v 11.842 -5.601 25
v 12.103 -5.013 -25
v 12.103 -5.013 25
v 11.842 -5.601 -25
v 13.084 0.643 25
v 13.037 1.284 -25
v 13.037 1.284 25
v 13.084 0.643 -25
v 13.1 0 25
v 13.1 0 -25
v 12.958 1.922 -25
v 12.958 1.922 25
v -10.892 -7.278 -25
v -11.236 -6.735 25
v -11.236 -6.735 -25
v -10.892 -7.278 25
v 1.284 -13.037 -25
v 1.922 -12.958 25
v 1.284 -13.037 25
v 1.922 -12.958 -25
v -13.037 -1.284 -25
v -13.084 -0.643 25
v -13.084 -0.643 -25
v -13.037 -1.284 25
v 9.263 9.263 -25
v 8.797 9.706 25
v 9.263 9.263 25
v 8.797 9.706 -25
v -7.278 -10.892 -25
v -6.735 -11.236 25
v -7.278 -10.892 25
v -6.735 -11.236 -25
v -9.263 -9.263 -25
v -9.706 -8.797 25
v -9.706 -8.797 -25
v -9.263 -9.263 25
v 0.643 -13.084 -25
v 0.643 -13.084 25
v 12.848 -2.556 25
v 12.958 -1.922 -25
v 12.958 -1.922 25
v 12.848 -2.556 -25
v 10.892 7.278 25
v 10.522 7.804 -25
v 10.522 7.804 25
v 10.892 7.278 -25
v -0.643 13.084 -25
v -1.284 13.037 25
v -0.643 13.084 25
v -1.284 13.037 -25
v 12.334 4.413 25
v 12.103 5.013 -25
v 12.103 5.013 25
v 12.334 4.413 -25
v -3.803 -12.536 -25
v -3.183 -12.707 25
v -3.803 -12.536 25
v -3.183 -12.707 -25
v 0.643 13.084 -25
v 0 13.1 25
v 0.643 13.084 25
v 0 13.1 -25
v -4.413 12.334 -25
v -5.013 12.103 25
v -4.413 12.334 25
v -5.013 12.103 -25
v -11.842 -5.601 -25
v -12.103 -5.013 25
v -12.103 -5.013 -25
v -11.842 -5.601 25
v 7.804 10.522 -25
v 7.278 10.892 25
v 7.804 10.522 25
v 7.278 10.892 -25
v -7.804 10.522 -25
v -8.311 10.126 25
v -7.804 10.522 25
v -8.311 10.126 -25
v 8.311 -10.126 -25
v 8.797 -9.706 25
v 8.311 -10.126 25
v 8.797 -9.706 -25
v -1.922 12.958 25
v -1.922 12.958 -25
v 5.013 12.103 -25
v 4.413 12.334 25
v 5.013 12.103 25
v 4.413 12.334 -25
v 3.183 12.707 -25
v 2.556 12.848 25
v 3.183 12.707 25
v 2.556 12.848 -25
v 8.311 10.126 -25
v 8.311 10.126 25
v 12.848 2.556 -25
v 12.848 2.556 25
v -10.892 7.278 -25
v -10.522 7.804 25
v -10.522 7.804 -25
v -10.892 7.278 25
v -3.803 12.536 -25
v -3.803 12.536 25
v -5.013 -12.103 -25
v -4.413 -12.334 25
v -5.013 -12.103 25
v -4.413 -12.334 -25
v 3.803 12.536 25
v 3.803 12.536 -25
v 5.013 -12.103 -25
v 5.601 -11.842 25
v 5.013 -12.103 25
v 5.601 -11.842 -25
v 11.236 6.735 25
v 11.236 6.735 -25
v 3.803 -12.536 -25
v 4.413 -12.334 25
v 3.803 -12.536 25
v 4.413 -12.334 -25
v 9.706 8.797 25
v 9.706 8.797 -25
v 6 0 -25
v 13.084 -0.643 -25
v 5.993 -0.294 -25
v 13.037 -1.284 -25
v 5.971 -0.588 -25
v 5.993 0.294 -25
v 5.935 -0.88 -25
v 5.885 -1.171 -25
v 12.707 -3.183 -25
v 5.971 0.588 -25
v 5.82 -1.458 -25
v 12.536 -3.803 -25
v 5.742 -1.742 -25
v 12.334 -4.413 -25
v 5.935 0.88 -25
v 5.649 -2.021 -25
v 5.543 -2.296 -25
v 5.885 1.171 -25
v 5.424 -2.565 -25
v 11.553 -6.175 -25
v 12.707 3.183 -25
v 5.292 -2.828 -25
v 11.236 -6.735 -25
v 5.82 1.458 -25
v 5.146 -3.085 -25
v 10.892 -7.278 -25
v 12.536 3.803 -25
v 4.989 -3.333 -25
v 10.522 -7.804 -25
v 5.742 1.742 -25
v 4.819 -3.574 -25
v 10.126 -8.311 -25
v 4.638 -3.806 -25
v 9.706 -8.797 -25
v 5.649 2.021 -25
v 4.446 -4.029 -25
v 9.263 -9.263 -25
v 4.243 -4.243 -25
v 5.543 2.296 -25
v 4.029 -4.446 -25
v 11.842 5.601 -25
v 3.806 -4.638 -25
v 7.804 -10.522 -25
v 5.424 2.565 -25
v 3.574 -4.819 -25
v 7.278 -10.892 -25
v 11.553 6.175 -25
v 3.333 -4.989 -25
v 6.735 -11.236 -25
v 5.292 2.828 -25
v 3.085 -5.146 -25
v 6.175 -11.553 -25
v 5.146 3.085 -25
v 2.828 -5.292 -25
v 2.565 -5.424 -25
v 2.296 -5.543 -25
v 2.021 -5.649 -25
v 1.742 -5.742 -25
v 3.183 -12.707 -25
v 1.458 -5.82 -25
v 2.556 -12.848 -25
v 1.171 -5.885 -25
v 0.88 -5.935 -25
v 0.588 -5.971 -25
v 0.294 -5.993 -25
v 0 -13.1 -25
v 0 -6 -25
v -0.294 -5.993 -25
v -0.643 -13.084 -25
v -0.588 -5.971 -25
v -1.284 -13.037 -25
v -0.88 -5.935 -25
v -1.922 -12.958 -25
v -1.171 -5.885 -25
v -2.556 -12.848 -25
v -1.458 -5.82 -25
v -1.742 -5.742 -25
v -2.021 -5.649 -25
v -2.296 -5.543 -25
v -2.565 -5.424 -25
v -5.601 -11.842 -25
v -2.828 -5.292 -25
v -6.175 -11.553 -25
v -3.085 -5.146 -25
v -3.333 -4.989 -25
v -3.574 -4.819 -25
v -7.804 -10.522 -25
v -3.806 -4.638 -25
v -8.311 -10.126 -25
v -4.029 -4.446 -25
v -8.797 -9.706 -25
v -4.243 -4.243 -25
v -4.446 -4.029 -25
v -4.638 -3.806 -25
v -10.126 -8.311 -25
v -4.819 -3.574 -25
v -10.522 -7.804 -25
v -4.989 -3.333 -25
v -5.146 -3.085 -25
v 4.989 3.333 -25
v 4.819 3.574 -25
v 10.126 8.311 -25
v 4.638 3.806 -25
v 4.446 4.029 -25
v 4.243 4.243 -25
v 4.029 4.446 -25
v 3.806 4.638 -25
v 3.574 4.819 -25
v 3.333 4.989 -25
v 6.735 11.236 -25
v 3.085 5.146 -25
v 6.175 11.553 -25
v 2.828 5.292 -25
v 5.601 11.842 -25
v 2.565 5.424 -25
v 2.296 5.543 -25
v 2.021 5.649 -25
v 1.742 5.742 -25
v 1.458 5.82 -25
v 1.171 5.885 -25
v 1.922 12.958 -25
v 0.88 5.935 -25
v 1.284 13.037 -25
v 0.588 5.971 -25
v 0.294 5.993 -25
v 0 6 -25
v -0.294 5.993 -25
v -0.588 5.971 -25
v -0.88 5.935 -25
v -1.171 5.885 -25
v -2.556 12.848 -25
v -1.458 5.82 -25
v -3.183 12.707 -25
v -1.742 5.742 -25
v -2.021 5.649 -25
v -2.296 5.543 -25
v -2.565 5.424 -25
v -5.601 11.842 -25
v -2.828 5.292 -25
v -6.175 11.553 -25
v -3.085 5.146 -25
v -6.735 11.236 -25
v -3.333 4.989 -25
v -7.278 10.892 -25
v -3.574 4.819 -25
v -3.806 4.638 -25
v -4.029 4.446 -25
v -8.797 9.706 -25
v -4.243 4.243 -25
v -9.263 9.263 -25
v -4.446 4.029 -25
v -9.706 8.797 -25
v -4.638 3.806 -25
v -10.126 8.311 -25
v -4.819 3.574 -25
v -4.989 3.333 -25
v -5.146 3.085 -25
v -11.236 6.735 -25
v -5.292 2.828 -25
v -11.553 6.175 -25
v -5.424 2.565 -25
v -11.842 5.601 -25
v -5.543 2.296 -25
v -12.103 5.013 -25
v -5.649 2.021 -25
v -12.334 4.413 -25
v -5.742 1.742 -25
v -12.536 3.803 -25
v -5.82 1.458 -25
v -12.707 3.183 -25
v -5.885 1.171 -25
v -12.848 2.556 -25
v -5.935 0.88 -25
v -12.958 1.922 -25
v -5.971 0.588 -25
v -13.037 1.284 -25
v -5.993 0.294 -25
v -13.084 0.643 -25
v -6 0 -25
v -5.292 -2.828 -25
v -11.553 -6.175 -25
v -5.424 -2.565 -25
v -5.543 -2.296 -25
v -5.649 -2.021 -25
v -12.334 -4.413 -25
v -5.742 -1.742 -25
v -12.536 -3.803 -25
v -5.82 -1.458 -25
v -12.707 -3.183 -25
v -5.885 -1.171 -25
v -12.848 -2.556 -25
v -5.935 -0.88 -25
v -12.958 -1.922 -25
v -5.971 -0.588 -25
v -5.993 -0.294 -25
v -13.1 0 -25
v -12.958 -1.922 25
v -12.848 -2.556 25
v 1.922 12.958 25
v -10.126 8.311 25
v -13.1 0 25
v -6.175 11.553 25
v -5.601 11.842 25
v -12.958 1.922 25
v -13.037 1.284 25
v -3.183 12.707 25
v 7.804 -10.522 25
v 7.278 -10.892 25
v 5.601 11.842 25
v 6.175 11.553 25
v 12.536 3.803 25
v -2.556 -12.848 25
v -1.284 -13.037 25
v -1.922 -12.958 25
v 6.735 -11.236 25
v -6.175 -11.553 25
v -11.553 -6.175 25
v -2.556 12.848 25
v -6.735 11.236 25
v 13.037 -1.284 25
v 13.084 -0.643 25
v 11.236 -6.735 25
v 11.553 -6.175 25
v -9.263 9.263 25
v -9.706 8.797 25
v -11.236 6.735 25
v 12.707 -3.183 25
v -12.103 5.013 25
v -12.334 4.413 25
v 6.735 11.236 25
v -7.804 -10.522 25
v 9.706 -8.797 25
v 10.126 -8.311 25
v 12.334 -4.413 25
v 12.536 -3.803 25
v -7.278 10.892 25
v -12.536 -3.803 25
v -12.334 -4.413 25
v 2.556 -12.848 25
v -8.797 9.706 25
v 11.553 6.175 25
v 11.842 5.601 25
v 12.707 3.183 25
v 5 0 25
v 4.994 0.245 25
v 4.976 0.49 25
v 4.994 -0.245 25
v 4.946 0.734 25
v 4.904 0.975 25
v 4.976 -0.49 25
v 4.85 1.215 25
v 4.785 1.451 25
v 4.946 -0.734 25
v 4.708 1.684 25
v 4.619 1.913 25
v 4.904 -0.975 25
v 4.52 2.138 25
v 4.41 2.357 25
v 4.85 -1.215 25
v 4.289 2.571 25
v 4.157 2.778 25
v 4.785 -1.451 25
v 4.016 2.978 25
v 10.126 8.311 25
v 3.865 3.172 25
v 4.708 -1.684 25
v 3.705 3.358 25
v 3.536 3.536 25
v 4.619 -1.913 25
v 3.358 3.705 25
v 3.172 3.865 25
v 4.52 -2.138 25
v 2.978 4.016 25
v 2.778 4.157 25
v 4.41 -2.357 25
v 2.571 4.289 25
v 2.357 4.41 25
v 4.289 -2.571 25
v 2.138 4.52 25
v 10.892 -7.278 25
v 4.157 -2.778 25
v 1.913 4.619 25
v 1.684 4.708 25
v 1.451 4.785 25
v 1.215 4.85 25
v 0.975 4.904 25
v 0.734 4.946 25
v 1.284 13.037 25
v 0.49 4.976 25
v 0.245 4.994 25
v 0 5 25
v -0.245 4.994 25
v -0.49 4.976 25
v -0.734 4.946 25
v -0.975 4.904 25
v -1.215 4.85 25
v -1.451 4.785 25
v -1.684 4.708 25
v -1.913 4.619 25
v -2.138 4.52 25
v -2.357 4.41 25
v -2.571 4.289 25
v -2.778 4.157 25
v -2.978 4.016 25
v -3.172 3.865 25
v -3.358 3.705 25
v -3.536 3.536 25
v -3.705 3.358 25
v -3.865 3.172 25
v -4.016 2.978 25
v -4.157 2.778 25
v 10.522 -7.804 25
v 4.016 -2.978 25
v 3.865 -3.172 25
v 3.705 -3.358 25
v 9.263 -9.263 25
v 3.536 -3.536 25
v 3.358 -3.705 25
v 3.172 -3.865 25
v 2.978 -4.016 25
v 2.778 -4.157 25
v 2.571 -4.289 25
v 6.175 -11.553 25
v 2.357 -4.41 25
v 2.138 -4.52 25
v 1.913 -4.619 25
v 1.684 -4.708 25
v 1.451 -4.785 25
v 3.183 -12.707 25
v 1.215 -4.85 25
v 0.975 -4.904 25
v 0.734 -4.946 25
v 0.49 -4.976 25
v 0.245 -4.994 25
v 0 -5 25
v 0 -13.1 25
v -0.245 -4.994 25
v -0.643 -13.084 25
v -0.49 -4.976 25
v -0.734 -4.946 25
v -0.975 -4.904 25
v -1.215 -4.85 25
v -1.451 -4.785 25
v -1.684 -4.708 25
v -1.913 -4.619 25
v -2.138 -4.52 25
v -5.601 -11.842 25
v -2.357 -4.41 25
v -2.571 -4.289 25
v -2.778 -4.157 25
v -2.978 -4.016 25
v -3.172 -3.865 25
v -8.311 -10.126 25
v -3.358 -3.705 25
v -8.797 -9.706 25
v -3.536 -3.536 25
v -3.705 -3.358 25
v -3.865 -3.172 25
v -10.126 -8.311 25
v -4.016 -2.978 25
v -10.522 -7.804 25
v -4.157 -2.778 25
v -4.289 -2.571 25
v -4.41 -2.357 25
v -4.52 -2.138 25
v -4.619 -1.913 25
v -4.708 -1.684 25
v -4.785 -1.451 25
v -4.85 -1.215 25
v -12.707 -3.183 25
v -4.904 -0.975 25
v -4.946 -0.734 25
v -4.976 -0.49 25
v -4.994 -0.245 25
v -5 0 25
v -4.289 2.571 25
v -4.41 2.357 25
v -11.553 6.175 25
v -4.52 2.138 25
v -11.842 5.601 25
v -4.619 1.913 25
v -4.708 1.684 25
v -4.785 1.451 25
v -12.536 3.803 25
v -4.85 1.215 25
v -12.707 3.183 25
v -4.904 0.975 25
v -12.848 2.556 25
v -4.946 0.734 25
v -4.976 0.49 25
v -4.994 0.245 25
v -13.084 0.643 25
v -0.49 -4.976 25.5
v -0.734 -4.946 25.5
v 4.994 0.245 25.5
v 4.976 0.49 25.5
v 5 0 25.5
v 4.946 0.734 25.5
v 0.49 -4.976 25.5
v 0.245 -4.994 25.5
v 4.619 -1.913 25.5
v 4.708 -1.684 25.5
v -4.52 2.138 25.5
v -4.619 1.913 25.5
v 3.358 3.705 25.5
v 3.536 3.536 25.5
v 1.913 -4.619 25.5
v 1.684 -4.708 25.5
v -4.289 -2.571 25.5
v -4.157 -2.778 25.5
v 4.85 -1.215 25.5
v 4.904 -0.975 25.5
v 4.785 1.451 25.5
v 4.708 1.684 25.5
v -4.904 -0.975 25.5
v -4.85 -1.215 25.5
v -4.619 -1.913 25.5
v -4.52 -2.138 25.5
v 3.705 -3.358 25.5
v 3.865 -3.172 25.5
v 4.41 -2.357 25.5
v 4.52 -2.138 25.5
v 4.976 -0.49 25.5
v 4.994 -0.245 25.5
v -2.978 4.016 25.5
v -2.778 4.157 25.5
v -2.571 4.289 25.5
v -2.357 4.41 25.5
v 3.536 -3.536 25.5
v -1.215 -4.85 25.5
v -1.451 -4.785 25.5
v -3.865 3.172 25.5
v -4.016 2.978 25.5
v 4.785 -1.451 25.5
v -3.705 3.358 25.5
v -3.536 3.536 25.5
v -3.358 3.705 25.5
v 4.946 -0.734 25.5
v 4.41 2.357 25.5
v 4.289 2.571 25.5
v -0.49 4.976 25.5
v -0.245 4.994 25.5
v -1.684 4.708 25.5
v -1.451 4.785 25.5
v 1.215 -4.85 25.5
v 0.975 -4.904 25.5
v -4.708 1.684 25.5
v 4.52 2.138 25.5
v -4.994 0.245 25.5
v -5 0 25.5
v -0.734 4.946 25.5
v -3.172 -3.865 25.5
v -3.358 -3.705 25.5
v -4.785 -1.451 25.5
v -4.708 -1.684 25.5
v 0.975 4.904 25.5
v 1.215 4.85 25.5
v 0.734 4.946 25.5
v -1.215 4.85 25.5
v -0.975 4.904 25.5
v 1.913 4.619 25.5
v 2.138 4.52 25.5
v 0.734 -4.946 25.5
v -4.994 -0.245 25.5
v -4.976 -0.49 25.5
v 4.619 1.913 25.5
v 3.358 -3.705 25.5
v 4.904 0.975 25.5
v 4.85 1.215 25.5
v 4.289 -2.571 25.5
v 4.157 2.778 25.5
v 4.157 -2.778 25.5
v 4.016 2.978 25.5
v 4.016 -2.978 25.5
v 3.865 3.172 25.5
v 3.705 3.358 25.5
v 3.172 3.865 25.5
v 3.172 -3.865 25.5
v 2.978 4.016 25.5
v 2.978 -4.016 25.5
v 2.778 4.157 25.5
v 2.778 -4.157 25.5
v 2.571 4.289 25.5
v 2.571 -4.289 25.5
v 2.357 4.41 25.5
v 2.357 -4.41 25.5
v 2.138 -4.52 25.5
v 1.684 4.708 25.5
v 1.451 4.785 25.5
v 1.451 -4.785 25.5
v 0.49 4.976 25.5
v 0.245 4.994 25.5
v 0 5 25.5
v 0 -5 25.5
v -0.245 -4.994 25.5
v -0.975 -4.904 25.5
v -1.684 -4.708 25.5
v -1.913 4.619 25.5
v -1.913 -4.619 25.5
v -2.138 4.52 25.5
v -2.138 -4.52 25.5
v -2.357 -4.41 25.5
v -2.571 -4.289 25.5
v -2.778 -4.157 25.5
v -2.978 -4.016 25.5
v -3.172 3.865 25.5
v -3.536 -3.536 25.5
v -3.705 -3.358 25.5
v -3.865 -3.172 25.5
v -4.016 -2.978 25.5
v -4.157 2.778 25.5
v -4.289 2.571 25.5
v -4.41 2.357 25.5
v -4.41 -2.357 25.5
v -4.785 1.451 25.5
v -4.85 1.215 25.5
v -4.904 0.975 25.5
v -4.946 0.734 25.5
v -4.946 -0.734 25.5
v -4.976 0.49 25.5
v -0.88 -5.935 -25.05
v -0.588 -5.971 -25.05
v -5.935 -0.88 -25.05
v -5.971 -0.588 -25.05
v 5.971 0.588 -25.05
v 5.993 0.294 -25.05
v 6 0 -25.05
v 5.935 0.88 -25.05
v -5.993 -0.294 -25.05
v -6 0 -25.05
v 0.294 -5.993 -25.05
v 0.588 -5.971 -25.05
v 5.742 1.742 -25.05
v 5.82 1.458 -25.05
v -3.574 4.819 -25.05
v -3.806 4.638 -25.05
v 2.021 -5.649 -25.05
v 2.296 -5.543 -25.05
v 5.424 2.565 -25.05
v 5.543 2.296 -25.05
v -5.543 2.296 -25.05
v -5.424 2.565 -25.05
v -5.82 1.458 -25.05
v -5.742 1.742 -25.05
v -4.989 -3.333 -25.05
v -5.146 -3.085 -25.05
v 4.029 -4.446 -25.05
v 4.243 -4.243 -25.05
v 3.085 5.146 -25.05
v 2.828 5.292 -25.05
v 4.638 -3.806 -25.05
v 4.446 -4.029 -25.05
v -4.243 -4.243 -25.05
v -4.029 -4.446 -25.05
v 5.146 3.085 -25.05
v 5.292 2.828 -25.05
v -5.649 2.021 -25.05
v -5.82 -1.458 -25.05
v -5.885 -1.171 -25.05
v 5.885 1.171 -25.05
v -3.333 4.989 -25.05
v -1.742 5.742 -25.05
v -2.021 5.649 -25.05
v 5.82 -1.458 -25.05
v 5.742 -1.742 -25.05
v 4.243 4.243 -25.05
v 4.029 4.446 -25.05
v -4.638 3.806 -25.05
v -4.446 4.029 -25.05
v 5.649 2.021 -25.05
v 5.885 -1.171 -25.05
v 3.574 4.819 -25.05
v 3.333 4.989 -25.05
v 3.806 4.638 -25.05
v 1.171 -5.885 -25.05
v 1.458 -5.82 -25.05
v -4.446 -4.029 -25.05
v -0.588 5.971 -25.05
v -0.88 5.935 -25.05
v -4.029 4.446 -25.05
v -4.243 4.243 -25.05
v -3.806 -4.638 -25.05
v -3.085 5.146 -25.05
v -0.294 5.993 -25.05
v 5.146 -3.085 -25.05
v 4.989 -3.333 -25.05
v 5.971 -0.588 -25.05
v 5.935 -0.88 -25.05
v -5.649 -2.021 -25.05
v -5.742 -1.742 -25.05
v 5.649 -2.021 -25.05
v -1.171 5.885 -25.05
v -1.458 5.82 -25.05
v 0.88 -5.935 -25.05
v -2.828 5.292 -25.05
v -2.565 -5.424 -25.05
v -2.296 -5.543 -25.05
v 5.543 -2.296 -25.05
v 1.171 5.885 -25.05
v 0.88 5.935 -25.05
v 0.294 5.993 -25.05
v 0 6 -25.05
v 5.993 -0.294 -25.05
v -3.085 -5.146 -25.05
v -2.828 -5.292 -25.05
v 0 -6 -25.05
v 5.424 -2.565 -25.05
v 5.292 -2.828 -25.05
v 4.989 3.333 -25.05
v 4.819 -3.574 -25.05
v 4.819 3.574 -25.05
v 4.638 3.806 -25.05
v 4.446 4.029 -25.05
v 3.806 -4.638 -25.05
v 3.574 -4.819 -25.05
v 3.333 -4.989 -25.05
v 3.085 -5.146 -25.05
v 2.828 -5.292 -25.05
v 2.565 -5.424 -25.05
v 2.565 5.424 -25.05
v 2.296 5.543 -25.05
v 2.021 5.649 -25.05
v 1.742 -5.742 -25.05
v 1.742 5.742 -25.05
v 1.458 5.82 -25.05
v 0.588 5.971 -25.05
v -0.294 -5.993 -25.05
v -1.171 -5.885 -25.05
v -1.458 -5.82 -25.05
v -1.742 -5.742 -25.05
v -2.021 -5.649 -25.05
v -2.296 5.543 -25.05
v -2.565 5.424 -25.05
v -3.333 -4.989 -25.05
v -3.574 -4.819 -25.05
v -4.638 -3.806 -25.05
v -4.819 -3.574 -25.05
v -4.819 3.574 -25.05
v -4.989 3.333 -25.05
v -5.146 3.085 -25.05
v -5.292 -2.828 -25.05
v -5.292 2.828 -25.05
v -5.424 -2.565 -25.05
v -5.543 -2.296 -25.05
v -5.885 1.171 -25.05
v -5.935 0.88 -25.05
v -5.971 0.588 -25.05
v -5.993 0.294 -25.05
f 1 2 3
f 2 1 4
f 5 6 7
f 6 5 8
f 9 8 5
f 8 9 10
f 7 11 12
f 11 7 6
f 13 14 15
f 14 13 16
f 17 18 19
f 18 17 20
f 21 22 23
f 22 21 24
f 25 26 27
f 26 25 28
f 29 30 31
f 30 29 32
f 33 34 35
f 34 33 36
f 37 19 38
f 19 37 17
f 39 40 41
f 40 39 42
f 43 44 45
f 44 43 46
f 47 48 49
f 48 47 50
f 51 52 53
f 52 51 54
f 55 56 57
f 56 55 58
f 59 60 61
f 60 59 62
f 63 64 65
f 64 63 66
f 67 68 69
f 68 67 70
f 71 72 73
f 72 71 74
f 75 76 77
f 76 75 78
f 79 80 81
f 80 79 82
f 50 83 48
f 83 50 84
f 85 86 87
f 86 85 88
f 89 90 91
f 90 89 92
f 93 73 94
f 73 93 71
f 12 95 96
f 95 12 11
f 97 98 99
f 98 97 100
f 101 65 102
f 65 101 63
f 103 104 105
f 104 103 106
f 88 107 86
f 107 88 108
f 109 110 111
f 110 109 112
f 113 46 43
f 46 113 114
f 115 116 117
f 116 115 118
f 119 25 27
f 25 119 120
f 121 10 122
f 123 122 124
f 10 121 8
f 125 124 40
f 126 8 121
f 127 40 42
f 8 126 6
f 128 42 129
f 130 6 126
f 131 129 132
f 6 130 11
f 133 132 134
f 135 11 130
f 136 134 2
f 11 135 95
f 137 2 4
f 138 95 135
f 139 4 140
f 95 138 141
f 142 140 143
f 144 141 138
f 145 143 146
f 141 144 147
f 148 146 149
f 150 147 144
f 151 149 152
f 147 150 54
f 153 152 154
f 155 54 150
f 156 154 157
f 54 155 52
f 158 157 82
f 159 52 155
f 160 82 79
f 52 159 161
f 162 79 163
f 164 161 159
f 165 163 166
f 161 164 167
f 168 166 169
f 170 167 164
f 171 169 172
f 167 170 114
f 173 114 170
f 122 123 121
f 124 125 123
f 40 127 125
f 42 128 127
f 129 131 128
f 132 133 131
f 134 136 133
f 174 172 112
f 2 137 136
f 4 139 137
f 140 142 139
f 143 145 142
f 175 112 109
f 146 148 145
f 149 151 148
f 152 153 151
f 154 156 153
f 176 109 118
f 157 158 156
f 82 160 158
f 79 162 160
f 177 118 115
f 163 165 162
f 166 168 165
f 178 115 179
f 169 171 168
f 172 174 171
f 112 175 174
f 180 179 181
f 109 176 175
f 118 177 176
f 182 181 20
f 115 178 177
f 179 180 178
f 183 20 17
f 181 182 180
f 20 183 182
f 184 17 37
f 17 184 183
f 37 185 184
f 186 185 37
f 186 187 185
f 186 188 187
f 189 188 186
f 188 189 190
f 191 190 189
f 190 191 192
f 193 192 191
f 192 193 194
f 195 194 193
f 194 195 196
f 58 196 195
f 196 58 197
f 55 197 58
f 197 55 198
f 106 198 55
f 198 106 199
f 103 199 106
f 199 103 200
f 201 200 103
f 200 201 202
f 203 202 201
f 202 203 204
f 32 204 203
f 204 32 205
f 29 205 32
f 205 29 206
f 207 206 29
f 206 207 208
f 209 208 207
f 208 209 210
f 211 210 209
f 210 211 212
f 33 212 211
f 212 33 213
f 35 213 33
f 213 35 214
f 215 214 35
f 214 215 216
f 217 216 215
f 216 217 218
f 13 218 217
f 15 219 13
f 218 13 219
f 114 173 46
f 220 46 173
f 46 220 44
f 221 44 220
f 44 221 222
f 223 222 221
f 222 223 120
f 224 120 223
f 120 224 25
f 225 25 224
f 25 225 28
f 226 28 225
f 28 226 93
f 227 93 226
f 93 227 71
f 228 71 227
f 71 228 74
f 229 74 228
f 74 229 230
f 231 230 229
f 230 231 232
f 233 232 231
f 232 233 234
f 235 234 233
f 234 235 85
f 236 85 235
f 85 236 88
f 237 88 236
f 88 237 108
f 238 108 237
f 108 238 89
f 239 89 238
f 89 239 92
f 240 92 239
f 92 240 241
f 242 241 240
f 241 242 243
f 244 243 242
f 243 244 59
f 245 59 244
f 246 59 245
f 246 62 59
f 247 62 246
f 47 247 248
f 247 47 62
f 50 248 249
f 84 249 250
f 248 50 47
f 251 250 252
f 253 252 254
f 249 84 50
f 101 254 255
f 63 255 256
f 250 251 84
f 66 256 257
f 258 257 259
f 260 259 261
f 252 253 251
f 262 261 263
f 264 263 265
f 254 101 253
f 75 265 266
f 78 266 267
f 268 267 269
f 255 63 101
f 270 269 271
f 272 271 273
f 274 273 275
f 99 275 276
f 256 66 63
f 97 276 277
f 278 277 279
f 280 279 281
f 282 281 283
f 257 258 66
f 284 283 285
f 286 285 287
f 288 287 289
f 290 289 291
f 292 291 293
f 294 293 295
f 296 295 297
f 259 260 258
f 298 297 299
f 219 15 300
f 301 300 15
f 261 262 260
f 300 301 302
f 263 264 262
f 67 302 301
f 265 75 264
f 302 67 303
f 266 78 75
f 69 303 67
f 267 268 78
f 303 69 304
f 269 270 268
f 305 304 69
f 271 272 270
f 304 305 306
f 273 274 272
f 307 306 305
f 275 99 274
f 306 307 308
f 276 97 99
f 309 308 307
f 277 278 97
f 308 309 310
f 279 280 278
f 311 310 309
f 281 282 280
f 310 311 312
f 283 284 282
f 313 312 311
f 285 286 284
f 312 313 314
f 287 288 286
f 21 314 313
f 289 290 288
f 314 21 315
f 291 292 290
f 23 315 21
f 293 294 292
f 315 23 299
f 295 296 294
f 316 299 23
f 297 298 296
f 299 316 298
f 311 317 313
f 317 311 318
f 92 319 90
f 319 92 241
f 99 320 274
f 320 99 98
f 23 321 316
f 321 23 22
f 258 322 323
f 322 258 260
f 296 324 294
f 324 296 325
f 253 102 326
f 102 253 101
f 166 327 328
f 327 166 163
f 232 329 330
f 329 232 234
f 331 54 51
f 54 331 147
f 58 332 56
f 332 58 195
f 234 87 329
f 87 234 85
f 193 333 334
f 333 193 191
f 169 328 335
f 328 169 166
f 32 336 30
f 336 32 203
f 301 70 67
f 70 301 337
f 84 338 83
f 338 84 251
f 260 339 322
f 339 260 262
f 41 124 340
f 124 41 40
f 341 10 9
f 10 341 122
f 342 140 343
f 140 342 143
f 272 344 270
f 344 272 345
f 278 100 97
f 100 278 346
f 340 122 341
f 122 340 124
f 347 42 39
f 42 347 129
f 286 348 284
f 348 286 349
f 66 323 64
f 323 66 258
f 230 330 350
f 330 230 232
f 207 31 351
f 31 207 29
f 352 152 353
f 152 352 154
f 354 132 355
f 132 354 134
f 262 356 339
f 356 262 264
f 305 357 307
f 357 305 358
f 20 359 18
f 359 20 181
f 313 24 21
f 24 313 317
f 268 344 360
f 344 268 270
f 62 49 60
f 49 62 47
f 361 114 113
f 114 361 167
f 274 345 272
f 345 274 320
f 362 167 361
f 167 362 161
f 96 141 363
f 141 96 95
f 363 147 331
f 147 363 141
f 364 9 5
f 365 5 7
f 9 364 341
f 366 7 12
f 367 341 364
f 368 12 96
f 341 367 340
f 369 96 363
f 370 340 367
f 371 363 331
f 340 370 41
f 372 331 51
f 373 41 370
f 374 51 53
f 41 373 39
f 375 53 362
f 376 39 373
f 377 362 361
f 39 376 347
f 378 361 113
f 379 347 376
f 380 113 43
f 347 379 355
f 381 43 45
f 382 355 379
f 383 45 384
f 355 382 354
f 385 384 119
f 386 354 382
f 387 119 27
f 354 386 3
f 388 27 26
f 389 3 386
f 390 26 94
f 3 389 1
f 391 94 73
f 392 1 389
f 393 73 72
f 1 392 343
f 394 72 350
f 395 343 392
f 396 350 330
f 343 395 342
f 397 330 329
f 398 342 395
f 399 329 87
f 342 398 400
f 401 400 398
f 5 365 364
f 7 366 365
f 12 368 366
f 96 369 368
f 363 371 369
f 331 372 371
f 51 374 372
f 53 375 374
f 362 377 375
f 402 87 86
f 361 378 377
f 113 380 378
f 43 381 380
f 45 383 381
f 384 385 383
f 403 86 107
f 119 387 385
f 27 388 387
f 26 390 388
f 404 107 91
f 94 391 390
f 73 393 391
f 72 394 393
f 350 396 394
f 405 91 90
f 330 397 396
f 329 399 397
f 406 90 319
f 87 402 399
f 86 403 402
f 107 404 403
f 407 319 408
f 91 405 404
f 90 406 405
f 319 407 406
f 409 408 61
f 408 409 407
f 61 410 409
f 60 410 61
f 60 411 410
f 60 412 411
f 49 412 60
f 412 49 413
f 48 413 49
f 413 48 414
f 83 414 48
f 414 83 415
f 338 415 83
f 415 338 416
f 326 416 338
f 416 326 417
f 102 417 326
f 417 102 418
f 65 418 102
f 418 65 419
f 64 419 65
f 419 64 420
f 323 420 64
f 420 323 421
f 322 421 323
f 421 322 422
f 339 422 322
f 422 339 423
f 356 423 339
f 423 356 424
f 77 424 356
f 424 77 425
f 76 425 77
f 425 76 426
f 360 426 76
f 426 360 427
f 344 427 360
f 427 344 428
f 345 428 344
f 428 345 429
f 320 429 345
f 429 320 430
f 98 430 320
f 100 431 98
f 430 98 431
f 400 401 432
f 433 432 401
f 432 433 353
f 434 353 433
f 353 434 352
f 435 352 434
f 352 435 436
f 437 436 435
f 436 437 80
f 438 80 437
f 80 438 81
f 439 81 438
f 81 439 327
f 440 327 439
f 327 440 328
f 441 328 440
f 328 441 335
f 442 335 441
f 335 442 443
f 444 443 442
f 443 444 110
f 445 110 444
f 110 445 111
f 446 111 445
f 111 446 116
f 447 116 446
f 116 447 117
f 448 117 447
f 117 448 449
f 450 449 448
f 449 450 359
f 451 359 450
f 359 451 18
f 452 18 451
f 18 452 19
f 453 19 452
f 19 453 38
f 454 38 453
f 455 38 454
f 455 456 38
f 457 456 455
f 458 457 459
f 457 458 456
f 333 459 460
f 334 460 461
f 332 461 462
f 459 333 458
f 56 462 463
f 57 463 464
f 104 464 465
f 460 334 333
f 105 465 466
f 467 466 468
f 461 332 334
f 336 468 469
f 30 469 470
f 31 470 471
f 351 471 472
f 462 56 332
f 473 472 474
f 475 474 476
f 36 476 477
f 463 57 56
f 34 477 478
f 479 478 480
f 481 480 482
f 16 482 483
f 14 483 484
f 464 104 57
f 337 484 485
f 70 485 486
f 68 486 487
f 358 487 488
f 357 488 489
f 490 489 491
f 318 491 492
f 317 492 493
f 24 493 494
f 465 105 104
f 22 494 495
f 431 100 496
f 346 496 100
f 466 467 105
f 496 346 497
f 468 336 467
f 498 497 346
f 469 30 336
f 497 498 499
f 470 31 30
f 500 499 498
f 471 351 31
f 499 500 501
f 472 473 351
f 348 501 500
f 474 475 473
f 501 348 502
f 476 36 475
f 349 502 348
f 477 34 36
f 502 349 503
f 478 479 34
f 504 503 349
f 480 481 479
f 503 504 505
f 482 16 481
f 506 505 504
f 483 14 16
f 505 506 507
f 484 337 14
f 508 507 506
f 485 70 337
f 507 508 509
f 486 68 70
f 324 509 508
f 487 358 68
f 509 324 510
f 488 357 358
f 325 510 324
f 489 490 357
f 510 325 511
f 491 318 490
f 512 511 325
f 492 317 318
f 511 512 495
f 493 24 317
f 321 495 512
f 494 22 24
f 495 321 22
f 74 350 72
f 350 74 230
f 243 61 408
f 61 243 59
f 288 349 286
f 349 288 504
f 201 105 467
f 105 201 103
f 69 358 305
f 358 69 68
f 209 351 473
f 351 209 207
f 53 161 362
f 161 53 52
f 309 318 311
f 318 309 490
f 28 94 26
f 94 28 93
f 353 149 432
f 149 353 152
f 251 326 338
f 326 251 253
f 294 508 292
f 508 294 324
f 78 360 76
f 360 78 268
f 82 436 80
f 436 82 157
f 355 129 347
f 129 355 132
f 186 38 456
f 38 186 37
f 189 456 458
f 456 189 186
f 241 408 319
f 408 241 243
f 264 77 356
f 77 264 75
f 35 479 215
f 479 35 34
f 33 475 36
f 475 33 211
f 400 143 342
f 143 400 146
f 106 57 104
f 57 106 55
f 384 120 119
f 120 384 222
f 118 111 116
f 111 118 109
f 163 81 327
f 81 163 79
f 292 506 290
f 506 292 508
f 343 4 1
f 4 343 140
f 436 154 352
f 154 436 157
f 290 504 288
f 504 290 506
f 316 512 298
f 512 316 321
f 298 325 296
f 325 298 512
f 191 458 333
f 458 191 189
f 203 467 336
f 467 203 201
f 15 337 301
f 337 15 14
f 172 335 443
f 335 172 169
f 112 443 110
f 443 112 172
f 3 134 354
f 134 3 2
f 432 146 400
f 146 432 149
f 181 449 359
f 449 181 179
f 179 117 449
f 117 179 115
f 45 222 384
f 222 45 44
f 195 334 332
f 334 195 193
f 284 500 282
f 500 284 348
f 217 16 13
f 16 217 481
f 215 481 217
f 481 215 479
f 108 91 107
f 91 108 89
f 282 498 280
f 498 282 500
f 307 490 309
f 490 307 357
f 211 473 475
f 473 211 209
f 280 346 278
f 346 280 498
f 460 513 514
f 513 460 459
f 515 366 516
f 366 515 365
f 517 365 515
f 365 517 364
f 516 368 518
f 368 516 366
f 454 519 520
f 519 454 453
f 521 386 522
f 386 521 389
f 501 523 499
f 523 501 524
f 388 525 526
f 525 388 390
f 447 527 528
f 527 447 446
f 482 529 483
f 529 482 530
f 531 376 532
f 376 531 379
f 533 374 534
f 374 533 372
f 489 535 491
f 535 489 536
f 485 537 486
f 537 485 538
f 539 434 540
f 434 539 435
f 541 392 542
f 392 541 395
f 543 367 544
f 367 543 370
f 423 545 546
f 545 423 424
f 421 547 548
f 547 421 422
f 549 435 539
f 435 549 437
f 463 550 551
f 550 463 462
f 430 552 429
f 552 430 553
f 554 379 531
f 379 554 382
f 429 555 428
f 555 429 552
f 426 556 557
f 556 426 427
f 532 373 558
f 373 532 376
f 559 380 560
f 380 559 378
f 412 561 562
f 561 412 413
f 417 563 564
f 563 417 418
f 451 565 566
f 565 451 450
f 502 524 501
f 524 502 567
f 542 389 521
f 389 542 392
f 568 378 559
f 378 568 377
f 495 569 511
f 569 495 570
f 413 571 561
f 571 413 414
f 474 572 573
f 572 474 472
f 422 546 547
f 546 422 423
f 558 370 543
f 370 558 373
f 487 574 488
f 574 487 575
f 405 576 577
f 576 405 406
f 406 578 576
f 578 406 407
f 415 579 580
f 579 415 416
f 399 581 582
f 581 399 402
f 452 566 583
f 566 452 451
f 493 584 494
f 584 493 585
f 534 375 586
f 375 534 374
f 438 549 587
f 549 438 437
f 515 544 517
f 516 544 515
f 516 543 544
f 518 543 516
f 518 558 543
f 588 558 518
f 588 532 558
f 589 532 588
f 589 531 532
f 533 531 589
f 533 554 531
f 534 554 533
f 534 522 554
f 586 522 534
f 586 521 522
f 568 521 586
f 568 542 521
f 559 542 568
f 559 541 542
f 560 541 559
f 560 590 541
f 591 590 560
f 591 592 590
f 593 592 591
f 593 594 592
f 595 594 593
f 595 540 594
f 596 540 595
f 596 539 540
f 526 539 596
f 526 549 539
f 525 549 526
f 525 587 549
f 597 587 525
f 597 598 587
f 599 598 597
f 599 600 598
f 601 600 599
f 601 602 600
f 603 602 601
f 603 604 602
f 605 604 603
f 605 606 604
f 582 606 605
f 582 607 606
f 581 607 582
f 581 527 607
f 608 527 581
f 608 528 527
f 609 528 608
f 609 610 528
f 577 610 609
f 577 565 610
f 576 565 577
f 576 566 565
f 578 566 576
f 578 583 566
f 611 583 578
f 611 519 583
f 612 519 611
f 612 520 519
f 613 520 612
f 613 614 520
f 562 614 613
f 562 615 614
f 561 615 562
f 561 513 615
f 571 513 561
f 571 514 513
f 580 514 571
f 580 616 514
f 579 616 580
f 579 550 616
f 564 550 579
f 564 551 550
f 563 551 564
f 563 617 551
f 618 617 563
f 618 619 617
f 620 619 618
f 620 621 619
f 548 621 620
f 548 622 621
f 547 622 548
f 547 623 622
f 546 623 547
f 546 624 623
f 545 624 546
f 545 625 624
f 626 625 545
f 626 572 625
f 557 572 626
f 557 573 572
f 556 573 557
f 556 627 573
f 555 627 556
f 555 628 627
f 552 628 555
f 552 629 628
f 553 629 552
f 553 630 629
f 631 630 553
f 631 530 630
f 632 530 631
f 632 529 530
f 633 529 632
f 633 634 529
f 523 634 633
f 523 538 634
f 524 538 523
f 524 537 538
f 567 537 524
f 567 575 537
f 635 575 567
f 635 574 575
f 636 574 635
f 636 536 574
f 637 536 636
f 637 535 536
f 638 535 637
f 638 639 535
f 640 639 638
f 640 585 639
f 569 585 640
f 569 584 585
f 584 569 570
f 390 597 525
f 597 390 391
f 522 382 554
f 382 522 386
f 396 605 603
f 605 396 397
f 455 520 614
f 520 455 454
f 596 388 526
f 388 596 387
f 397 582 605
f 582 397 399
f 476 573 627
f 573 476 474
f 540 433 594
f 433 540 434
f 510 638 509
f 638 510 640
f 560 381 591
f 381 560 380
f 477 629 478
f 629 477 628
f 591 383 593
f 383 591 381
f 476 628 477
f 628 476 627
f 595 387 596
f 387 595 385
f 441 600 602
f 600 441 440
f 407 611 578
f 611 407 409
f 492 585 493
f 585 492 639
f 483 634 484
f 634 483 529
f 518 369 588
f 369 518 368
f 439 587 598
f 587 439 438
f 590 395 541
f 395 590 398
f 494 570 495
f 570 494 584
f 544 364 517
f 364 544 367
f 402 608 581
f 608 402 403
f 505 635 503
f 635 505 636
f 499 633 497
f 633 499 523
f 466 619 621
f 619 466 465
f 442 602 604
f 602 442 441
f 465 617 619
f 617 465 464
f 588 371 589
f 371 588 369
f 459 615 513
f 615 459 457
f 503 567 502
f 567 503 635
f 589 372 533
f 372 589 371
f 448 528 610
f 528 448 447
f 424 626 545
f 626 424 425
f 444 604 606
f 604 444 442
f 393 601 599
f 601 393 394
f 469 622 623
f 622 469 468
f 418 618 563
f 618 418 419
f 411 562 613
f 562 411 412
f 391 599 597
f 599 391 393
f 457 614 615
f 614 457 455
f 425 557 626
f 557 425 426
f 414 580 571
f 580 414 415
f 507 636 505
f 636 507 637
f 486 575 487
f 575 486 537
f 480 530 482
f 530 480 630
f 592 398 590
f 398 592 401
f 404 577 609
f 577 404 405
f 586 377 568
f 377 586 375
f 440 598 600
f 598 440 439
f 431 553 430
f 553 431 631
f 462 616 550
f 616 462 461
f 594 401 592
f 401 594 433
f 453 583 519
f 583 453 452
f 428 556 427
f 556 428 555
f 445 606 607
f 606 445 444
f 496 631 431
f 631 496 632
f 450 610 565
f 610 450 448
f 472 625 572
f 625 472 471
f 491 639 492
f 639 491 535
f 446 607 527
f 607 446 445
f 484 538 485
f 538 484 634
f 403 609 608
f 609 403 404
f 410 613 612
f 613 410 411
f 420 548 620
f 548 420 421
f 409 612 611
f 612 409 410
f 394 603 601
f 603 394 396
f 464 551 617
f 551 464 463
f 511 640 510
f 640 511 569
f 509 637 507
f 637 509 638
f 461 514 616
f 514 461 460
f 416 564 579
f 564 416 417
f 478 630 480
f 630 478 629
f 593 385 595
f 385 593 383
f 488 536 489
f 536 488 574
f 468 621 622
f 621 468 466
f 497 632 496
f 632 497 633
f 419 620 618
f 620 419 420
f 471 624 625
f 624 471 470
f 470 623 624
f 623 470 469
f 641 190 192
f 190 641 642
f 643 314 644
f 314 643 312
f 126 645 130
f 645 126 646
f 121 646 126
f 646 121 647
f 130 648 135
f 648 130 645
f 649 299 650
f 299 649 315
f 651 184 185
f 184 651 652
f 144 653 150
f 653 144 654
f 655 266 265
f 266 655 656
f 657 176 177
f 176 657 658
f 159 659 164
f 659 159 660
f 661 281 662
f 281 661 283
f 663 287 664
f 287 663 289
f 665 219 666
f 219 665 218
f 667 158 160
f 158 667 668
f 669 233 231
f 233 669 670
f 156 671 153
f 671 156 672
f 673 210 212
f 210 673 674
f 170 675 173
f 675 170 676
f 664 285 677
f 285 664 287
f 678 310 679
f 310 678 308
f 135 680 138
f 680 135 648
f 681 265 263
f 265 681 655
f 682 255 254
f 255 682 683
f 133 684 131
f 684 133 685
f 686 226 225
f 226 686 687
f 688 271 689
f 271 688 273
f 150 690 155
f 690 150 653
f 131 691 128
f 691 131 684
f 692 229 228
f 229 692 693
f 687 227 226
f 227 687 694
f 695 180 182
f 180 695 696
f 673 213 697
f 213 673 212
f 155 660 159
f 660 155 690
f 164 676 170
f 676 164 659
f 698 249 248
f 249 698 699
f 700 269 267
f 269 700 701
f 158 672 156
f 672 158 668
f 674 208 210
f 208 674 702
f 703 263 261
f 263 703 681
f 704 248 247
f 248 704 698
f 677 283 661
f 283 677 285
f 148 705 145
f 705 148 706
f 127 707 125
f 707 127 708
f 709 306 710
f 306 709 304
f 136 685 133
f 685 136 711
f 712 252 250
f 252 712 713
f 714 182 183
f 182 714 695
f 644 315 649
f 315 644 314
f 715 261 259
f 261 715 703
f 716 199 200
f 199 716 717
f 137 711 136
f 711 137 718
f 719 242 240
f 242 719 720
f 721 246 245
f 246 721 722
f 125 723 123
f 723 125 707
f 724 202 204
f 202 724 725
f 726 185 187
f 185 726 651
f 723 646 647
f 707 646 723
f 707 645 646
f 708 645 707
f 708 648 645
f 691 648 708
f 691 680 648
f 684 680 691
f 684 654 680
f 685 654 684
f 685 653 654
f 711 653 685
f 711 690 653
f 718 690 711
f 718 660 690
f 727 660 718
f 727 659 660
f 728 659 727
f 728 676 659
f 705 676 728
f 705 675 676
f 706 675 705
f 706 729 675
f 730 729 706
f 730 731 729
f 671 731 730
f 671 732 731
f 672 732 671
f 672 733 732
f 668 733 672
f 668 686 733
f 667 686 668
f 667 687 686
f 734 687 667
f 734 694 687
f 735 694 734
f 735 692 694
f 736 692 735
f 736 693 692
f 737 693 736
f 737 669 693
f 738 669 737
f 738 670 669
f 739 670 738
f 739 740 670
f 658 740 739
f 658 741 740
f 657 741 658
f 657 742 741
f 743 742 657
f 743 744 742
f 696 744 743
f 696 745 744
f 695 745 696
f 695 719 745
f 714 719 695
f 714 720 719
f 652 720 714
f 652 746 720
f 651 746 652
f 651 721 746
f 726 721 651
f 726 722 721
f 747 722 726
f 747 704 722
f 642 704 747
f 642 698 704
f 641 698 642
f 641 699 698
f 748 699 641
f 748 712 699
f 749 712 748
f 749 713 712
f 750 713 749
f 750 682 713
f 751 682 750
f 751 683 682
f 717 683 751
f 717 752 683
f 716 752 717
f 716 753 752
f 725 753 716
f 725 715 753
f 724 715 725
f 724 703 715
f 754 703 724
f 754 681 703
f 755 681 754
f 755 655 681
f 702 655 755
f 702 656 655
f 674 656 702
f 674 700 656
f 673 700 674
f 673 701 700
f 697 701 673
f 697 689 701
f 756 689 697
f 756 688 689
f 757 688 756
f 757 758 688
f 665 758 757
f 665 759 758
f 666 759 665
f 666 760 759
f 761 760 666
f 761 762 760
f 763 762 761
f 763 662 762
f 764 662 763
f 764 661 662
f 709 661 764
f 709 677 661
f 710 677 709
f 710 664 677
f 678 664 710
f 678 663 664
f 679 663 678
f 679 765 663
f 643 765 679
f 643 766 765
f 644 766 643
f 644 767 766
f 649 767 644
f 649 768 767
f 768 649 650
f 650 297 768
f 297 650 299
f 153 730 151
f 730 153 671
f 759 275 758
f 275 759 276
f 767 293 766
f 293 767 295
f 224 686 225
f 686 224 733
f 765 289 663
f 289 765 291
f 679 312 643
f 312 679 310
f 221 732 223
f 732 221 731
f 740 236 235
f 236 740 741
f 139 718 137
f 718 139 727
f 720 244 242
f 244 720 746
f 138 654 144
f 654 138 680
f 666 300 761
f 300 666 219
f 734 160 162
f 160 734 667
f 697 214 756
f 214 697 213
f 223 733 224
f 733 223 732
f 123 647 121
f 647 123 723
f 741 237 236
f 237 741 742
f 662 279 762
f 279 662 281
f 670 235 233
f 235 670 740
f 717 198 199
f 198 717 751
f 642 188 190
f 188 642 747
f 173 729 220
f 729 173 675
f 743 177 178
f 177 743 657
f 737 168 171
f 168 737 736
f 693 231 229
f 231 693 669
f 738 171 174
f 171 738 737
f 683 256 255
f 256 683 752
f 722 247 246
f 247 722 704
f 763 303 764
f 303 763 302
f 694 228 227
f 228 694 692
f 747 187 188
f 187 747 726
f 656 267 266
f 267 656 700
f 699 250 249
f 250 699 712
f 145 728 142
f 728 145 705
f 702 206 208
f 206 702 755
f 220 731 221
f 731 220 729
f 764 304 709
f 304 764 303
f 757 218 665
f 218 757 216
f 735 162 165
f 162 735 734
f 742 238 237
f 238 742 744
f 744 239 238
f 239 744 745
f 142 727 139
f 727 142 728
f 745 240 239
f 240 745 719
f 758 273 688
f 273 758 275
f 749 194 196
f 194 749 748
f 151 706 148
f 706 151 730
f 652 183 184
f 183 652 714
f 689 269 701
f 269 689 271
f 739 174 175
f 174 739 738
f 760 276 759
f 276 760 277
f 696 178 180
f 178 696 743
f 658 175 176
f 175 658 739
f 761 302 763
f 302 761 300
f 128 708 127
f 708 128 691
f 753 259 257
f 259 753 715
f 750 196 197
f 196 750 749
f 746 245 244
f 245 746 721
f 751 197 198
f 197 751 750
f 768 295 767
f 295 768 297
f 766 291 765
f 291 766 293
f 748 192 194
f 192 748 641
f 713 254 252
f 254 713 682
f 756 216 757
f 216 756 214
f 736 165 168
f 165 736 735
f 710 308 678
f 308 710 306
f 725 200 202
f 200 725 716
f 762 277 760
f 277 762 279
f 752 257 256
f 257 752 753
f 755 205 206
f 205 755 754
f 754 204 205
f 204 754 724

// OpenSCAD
// Battery cell: 50.0mm tall, 26.2mm diameter (one connected solid)

height_mm = 50.0; //[25.0:100.0:0.1]
diameter_mm = 26.2; //[13.1:52.4:0.1]

positive_terminal_diameter_mm = 10.0; //[5.0:20.0:0.1]
positive_terminal_height_mm = 1.5; //[0.75:3.0:0.1]

negative_terminal_diameter_mm = 12.0; //[6.0:24.0:0.1]
negative_terminal_height_mm = 0.5; //[0.25:1.0:0.05]

terminal_overlap_mm = 1.0; //[0.5:2.0:0.1]

$fn = 128;

module battery_cell() {
    r_body = diameter_mm/2;

    // Ensure a real overlap (prevents coincident faces) and never exceed terminal height
    eps = 0.05;
    overlap_pos = min(positive_terminal_height_mm - eps, terminal_overlap_mm);
    overlap_neg = min(negative_terminal_height_mm - eps, terminal_overlap_mm);

    union() {
        // Main body
        cylinder(r=r_body, h=height_mm, center=true);

        // Positive terminal (top), overlaps into body
        translate([0, 0, height_mm/2 + positive_terminal_height_mm/2 - overlap_pos])
            cylinder(r=positive_terminal_diameter_mm/2, h=positive_terminal_height_mm, center=true);

        // Negative terminal (bottom), overlaps into body
        translate([0, 0, -height_mm/2 - negative_terminal_height_mm/2 + overlap_neg])
            cylinder(r=negative_terminal_diameter_mm/2, h=negative_terminal_height_mm, center=true);
    }
}

battery_cell();
